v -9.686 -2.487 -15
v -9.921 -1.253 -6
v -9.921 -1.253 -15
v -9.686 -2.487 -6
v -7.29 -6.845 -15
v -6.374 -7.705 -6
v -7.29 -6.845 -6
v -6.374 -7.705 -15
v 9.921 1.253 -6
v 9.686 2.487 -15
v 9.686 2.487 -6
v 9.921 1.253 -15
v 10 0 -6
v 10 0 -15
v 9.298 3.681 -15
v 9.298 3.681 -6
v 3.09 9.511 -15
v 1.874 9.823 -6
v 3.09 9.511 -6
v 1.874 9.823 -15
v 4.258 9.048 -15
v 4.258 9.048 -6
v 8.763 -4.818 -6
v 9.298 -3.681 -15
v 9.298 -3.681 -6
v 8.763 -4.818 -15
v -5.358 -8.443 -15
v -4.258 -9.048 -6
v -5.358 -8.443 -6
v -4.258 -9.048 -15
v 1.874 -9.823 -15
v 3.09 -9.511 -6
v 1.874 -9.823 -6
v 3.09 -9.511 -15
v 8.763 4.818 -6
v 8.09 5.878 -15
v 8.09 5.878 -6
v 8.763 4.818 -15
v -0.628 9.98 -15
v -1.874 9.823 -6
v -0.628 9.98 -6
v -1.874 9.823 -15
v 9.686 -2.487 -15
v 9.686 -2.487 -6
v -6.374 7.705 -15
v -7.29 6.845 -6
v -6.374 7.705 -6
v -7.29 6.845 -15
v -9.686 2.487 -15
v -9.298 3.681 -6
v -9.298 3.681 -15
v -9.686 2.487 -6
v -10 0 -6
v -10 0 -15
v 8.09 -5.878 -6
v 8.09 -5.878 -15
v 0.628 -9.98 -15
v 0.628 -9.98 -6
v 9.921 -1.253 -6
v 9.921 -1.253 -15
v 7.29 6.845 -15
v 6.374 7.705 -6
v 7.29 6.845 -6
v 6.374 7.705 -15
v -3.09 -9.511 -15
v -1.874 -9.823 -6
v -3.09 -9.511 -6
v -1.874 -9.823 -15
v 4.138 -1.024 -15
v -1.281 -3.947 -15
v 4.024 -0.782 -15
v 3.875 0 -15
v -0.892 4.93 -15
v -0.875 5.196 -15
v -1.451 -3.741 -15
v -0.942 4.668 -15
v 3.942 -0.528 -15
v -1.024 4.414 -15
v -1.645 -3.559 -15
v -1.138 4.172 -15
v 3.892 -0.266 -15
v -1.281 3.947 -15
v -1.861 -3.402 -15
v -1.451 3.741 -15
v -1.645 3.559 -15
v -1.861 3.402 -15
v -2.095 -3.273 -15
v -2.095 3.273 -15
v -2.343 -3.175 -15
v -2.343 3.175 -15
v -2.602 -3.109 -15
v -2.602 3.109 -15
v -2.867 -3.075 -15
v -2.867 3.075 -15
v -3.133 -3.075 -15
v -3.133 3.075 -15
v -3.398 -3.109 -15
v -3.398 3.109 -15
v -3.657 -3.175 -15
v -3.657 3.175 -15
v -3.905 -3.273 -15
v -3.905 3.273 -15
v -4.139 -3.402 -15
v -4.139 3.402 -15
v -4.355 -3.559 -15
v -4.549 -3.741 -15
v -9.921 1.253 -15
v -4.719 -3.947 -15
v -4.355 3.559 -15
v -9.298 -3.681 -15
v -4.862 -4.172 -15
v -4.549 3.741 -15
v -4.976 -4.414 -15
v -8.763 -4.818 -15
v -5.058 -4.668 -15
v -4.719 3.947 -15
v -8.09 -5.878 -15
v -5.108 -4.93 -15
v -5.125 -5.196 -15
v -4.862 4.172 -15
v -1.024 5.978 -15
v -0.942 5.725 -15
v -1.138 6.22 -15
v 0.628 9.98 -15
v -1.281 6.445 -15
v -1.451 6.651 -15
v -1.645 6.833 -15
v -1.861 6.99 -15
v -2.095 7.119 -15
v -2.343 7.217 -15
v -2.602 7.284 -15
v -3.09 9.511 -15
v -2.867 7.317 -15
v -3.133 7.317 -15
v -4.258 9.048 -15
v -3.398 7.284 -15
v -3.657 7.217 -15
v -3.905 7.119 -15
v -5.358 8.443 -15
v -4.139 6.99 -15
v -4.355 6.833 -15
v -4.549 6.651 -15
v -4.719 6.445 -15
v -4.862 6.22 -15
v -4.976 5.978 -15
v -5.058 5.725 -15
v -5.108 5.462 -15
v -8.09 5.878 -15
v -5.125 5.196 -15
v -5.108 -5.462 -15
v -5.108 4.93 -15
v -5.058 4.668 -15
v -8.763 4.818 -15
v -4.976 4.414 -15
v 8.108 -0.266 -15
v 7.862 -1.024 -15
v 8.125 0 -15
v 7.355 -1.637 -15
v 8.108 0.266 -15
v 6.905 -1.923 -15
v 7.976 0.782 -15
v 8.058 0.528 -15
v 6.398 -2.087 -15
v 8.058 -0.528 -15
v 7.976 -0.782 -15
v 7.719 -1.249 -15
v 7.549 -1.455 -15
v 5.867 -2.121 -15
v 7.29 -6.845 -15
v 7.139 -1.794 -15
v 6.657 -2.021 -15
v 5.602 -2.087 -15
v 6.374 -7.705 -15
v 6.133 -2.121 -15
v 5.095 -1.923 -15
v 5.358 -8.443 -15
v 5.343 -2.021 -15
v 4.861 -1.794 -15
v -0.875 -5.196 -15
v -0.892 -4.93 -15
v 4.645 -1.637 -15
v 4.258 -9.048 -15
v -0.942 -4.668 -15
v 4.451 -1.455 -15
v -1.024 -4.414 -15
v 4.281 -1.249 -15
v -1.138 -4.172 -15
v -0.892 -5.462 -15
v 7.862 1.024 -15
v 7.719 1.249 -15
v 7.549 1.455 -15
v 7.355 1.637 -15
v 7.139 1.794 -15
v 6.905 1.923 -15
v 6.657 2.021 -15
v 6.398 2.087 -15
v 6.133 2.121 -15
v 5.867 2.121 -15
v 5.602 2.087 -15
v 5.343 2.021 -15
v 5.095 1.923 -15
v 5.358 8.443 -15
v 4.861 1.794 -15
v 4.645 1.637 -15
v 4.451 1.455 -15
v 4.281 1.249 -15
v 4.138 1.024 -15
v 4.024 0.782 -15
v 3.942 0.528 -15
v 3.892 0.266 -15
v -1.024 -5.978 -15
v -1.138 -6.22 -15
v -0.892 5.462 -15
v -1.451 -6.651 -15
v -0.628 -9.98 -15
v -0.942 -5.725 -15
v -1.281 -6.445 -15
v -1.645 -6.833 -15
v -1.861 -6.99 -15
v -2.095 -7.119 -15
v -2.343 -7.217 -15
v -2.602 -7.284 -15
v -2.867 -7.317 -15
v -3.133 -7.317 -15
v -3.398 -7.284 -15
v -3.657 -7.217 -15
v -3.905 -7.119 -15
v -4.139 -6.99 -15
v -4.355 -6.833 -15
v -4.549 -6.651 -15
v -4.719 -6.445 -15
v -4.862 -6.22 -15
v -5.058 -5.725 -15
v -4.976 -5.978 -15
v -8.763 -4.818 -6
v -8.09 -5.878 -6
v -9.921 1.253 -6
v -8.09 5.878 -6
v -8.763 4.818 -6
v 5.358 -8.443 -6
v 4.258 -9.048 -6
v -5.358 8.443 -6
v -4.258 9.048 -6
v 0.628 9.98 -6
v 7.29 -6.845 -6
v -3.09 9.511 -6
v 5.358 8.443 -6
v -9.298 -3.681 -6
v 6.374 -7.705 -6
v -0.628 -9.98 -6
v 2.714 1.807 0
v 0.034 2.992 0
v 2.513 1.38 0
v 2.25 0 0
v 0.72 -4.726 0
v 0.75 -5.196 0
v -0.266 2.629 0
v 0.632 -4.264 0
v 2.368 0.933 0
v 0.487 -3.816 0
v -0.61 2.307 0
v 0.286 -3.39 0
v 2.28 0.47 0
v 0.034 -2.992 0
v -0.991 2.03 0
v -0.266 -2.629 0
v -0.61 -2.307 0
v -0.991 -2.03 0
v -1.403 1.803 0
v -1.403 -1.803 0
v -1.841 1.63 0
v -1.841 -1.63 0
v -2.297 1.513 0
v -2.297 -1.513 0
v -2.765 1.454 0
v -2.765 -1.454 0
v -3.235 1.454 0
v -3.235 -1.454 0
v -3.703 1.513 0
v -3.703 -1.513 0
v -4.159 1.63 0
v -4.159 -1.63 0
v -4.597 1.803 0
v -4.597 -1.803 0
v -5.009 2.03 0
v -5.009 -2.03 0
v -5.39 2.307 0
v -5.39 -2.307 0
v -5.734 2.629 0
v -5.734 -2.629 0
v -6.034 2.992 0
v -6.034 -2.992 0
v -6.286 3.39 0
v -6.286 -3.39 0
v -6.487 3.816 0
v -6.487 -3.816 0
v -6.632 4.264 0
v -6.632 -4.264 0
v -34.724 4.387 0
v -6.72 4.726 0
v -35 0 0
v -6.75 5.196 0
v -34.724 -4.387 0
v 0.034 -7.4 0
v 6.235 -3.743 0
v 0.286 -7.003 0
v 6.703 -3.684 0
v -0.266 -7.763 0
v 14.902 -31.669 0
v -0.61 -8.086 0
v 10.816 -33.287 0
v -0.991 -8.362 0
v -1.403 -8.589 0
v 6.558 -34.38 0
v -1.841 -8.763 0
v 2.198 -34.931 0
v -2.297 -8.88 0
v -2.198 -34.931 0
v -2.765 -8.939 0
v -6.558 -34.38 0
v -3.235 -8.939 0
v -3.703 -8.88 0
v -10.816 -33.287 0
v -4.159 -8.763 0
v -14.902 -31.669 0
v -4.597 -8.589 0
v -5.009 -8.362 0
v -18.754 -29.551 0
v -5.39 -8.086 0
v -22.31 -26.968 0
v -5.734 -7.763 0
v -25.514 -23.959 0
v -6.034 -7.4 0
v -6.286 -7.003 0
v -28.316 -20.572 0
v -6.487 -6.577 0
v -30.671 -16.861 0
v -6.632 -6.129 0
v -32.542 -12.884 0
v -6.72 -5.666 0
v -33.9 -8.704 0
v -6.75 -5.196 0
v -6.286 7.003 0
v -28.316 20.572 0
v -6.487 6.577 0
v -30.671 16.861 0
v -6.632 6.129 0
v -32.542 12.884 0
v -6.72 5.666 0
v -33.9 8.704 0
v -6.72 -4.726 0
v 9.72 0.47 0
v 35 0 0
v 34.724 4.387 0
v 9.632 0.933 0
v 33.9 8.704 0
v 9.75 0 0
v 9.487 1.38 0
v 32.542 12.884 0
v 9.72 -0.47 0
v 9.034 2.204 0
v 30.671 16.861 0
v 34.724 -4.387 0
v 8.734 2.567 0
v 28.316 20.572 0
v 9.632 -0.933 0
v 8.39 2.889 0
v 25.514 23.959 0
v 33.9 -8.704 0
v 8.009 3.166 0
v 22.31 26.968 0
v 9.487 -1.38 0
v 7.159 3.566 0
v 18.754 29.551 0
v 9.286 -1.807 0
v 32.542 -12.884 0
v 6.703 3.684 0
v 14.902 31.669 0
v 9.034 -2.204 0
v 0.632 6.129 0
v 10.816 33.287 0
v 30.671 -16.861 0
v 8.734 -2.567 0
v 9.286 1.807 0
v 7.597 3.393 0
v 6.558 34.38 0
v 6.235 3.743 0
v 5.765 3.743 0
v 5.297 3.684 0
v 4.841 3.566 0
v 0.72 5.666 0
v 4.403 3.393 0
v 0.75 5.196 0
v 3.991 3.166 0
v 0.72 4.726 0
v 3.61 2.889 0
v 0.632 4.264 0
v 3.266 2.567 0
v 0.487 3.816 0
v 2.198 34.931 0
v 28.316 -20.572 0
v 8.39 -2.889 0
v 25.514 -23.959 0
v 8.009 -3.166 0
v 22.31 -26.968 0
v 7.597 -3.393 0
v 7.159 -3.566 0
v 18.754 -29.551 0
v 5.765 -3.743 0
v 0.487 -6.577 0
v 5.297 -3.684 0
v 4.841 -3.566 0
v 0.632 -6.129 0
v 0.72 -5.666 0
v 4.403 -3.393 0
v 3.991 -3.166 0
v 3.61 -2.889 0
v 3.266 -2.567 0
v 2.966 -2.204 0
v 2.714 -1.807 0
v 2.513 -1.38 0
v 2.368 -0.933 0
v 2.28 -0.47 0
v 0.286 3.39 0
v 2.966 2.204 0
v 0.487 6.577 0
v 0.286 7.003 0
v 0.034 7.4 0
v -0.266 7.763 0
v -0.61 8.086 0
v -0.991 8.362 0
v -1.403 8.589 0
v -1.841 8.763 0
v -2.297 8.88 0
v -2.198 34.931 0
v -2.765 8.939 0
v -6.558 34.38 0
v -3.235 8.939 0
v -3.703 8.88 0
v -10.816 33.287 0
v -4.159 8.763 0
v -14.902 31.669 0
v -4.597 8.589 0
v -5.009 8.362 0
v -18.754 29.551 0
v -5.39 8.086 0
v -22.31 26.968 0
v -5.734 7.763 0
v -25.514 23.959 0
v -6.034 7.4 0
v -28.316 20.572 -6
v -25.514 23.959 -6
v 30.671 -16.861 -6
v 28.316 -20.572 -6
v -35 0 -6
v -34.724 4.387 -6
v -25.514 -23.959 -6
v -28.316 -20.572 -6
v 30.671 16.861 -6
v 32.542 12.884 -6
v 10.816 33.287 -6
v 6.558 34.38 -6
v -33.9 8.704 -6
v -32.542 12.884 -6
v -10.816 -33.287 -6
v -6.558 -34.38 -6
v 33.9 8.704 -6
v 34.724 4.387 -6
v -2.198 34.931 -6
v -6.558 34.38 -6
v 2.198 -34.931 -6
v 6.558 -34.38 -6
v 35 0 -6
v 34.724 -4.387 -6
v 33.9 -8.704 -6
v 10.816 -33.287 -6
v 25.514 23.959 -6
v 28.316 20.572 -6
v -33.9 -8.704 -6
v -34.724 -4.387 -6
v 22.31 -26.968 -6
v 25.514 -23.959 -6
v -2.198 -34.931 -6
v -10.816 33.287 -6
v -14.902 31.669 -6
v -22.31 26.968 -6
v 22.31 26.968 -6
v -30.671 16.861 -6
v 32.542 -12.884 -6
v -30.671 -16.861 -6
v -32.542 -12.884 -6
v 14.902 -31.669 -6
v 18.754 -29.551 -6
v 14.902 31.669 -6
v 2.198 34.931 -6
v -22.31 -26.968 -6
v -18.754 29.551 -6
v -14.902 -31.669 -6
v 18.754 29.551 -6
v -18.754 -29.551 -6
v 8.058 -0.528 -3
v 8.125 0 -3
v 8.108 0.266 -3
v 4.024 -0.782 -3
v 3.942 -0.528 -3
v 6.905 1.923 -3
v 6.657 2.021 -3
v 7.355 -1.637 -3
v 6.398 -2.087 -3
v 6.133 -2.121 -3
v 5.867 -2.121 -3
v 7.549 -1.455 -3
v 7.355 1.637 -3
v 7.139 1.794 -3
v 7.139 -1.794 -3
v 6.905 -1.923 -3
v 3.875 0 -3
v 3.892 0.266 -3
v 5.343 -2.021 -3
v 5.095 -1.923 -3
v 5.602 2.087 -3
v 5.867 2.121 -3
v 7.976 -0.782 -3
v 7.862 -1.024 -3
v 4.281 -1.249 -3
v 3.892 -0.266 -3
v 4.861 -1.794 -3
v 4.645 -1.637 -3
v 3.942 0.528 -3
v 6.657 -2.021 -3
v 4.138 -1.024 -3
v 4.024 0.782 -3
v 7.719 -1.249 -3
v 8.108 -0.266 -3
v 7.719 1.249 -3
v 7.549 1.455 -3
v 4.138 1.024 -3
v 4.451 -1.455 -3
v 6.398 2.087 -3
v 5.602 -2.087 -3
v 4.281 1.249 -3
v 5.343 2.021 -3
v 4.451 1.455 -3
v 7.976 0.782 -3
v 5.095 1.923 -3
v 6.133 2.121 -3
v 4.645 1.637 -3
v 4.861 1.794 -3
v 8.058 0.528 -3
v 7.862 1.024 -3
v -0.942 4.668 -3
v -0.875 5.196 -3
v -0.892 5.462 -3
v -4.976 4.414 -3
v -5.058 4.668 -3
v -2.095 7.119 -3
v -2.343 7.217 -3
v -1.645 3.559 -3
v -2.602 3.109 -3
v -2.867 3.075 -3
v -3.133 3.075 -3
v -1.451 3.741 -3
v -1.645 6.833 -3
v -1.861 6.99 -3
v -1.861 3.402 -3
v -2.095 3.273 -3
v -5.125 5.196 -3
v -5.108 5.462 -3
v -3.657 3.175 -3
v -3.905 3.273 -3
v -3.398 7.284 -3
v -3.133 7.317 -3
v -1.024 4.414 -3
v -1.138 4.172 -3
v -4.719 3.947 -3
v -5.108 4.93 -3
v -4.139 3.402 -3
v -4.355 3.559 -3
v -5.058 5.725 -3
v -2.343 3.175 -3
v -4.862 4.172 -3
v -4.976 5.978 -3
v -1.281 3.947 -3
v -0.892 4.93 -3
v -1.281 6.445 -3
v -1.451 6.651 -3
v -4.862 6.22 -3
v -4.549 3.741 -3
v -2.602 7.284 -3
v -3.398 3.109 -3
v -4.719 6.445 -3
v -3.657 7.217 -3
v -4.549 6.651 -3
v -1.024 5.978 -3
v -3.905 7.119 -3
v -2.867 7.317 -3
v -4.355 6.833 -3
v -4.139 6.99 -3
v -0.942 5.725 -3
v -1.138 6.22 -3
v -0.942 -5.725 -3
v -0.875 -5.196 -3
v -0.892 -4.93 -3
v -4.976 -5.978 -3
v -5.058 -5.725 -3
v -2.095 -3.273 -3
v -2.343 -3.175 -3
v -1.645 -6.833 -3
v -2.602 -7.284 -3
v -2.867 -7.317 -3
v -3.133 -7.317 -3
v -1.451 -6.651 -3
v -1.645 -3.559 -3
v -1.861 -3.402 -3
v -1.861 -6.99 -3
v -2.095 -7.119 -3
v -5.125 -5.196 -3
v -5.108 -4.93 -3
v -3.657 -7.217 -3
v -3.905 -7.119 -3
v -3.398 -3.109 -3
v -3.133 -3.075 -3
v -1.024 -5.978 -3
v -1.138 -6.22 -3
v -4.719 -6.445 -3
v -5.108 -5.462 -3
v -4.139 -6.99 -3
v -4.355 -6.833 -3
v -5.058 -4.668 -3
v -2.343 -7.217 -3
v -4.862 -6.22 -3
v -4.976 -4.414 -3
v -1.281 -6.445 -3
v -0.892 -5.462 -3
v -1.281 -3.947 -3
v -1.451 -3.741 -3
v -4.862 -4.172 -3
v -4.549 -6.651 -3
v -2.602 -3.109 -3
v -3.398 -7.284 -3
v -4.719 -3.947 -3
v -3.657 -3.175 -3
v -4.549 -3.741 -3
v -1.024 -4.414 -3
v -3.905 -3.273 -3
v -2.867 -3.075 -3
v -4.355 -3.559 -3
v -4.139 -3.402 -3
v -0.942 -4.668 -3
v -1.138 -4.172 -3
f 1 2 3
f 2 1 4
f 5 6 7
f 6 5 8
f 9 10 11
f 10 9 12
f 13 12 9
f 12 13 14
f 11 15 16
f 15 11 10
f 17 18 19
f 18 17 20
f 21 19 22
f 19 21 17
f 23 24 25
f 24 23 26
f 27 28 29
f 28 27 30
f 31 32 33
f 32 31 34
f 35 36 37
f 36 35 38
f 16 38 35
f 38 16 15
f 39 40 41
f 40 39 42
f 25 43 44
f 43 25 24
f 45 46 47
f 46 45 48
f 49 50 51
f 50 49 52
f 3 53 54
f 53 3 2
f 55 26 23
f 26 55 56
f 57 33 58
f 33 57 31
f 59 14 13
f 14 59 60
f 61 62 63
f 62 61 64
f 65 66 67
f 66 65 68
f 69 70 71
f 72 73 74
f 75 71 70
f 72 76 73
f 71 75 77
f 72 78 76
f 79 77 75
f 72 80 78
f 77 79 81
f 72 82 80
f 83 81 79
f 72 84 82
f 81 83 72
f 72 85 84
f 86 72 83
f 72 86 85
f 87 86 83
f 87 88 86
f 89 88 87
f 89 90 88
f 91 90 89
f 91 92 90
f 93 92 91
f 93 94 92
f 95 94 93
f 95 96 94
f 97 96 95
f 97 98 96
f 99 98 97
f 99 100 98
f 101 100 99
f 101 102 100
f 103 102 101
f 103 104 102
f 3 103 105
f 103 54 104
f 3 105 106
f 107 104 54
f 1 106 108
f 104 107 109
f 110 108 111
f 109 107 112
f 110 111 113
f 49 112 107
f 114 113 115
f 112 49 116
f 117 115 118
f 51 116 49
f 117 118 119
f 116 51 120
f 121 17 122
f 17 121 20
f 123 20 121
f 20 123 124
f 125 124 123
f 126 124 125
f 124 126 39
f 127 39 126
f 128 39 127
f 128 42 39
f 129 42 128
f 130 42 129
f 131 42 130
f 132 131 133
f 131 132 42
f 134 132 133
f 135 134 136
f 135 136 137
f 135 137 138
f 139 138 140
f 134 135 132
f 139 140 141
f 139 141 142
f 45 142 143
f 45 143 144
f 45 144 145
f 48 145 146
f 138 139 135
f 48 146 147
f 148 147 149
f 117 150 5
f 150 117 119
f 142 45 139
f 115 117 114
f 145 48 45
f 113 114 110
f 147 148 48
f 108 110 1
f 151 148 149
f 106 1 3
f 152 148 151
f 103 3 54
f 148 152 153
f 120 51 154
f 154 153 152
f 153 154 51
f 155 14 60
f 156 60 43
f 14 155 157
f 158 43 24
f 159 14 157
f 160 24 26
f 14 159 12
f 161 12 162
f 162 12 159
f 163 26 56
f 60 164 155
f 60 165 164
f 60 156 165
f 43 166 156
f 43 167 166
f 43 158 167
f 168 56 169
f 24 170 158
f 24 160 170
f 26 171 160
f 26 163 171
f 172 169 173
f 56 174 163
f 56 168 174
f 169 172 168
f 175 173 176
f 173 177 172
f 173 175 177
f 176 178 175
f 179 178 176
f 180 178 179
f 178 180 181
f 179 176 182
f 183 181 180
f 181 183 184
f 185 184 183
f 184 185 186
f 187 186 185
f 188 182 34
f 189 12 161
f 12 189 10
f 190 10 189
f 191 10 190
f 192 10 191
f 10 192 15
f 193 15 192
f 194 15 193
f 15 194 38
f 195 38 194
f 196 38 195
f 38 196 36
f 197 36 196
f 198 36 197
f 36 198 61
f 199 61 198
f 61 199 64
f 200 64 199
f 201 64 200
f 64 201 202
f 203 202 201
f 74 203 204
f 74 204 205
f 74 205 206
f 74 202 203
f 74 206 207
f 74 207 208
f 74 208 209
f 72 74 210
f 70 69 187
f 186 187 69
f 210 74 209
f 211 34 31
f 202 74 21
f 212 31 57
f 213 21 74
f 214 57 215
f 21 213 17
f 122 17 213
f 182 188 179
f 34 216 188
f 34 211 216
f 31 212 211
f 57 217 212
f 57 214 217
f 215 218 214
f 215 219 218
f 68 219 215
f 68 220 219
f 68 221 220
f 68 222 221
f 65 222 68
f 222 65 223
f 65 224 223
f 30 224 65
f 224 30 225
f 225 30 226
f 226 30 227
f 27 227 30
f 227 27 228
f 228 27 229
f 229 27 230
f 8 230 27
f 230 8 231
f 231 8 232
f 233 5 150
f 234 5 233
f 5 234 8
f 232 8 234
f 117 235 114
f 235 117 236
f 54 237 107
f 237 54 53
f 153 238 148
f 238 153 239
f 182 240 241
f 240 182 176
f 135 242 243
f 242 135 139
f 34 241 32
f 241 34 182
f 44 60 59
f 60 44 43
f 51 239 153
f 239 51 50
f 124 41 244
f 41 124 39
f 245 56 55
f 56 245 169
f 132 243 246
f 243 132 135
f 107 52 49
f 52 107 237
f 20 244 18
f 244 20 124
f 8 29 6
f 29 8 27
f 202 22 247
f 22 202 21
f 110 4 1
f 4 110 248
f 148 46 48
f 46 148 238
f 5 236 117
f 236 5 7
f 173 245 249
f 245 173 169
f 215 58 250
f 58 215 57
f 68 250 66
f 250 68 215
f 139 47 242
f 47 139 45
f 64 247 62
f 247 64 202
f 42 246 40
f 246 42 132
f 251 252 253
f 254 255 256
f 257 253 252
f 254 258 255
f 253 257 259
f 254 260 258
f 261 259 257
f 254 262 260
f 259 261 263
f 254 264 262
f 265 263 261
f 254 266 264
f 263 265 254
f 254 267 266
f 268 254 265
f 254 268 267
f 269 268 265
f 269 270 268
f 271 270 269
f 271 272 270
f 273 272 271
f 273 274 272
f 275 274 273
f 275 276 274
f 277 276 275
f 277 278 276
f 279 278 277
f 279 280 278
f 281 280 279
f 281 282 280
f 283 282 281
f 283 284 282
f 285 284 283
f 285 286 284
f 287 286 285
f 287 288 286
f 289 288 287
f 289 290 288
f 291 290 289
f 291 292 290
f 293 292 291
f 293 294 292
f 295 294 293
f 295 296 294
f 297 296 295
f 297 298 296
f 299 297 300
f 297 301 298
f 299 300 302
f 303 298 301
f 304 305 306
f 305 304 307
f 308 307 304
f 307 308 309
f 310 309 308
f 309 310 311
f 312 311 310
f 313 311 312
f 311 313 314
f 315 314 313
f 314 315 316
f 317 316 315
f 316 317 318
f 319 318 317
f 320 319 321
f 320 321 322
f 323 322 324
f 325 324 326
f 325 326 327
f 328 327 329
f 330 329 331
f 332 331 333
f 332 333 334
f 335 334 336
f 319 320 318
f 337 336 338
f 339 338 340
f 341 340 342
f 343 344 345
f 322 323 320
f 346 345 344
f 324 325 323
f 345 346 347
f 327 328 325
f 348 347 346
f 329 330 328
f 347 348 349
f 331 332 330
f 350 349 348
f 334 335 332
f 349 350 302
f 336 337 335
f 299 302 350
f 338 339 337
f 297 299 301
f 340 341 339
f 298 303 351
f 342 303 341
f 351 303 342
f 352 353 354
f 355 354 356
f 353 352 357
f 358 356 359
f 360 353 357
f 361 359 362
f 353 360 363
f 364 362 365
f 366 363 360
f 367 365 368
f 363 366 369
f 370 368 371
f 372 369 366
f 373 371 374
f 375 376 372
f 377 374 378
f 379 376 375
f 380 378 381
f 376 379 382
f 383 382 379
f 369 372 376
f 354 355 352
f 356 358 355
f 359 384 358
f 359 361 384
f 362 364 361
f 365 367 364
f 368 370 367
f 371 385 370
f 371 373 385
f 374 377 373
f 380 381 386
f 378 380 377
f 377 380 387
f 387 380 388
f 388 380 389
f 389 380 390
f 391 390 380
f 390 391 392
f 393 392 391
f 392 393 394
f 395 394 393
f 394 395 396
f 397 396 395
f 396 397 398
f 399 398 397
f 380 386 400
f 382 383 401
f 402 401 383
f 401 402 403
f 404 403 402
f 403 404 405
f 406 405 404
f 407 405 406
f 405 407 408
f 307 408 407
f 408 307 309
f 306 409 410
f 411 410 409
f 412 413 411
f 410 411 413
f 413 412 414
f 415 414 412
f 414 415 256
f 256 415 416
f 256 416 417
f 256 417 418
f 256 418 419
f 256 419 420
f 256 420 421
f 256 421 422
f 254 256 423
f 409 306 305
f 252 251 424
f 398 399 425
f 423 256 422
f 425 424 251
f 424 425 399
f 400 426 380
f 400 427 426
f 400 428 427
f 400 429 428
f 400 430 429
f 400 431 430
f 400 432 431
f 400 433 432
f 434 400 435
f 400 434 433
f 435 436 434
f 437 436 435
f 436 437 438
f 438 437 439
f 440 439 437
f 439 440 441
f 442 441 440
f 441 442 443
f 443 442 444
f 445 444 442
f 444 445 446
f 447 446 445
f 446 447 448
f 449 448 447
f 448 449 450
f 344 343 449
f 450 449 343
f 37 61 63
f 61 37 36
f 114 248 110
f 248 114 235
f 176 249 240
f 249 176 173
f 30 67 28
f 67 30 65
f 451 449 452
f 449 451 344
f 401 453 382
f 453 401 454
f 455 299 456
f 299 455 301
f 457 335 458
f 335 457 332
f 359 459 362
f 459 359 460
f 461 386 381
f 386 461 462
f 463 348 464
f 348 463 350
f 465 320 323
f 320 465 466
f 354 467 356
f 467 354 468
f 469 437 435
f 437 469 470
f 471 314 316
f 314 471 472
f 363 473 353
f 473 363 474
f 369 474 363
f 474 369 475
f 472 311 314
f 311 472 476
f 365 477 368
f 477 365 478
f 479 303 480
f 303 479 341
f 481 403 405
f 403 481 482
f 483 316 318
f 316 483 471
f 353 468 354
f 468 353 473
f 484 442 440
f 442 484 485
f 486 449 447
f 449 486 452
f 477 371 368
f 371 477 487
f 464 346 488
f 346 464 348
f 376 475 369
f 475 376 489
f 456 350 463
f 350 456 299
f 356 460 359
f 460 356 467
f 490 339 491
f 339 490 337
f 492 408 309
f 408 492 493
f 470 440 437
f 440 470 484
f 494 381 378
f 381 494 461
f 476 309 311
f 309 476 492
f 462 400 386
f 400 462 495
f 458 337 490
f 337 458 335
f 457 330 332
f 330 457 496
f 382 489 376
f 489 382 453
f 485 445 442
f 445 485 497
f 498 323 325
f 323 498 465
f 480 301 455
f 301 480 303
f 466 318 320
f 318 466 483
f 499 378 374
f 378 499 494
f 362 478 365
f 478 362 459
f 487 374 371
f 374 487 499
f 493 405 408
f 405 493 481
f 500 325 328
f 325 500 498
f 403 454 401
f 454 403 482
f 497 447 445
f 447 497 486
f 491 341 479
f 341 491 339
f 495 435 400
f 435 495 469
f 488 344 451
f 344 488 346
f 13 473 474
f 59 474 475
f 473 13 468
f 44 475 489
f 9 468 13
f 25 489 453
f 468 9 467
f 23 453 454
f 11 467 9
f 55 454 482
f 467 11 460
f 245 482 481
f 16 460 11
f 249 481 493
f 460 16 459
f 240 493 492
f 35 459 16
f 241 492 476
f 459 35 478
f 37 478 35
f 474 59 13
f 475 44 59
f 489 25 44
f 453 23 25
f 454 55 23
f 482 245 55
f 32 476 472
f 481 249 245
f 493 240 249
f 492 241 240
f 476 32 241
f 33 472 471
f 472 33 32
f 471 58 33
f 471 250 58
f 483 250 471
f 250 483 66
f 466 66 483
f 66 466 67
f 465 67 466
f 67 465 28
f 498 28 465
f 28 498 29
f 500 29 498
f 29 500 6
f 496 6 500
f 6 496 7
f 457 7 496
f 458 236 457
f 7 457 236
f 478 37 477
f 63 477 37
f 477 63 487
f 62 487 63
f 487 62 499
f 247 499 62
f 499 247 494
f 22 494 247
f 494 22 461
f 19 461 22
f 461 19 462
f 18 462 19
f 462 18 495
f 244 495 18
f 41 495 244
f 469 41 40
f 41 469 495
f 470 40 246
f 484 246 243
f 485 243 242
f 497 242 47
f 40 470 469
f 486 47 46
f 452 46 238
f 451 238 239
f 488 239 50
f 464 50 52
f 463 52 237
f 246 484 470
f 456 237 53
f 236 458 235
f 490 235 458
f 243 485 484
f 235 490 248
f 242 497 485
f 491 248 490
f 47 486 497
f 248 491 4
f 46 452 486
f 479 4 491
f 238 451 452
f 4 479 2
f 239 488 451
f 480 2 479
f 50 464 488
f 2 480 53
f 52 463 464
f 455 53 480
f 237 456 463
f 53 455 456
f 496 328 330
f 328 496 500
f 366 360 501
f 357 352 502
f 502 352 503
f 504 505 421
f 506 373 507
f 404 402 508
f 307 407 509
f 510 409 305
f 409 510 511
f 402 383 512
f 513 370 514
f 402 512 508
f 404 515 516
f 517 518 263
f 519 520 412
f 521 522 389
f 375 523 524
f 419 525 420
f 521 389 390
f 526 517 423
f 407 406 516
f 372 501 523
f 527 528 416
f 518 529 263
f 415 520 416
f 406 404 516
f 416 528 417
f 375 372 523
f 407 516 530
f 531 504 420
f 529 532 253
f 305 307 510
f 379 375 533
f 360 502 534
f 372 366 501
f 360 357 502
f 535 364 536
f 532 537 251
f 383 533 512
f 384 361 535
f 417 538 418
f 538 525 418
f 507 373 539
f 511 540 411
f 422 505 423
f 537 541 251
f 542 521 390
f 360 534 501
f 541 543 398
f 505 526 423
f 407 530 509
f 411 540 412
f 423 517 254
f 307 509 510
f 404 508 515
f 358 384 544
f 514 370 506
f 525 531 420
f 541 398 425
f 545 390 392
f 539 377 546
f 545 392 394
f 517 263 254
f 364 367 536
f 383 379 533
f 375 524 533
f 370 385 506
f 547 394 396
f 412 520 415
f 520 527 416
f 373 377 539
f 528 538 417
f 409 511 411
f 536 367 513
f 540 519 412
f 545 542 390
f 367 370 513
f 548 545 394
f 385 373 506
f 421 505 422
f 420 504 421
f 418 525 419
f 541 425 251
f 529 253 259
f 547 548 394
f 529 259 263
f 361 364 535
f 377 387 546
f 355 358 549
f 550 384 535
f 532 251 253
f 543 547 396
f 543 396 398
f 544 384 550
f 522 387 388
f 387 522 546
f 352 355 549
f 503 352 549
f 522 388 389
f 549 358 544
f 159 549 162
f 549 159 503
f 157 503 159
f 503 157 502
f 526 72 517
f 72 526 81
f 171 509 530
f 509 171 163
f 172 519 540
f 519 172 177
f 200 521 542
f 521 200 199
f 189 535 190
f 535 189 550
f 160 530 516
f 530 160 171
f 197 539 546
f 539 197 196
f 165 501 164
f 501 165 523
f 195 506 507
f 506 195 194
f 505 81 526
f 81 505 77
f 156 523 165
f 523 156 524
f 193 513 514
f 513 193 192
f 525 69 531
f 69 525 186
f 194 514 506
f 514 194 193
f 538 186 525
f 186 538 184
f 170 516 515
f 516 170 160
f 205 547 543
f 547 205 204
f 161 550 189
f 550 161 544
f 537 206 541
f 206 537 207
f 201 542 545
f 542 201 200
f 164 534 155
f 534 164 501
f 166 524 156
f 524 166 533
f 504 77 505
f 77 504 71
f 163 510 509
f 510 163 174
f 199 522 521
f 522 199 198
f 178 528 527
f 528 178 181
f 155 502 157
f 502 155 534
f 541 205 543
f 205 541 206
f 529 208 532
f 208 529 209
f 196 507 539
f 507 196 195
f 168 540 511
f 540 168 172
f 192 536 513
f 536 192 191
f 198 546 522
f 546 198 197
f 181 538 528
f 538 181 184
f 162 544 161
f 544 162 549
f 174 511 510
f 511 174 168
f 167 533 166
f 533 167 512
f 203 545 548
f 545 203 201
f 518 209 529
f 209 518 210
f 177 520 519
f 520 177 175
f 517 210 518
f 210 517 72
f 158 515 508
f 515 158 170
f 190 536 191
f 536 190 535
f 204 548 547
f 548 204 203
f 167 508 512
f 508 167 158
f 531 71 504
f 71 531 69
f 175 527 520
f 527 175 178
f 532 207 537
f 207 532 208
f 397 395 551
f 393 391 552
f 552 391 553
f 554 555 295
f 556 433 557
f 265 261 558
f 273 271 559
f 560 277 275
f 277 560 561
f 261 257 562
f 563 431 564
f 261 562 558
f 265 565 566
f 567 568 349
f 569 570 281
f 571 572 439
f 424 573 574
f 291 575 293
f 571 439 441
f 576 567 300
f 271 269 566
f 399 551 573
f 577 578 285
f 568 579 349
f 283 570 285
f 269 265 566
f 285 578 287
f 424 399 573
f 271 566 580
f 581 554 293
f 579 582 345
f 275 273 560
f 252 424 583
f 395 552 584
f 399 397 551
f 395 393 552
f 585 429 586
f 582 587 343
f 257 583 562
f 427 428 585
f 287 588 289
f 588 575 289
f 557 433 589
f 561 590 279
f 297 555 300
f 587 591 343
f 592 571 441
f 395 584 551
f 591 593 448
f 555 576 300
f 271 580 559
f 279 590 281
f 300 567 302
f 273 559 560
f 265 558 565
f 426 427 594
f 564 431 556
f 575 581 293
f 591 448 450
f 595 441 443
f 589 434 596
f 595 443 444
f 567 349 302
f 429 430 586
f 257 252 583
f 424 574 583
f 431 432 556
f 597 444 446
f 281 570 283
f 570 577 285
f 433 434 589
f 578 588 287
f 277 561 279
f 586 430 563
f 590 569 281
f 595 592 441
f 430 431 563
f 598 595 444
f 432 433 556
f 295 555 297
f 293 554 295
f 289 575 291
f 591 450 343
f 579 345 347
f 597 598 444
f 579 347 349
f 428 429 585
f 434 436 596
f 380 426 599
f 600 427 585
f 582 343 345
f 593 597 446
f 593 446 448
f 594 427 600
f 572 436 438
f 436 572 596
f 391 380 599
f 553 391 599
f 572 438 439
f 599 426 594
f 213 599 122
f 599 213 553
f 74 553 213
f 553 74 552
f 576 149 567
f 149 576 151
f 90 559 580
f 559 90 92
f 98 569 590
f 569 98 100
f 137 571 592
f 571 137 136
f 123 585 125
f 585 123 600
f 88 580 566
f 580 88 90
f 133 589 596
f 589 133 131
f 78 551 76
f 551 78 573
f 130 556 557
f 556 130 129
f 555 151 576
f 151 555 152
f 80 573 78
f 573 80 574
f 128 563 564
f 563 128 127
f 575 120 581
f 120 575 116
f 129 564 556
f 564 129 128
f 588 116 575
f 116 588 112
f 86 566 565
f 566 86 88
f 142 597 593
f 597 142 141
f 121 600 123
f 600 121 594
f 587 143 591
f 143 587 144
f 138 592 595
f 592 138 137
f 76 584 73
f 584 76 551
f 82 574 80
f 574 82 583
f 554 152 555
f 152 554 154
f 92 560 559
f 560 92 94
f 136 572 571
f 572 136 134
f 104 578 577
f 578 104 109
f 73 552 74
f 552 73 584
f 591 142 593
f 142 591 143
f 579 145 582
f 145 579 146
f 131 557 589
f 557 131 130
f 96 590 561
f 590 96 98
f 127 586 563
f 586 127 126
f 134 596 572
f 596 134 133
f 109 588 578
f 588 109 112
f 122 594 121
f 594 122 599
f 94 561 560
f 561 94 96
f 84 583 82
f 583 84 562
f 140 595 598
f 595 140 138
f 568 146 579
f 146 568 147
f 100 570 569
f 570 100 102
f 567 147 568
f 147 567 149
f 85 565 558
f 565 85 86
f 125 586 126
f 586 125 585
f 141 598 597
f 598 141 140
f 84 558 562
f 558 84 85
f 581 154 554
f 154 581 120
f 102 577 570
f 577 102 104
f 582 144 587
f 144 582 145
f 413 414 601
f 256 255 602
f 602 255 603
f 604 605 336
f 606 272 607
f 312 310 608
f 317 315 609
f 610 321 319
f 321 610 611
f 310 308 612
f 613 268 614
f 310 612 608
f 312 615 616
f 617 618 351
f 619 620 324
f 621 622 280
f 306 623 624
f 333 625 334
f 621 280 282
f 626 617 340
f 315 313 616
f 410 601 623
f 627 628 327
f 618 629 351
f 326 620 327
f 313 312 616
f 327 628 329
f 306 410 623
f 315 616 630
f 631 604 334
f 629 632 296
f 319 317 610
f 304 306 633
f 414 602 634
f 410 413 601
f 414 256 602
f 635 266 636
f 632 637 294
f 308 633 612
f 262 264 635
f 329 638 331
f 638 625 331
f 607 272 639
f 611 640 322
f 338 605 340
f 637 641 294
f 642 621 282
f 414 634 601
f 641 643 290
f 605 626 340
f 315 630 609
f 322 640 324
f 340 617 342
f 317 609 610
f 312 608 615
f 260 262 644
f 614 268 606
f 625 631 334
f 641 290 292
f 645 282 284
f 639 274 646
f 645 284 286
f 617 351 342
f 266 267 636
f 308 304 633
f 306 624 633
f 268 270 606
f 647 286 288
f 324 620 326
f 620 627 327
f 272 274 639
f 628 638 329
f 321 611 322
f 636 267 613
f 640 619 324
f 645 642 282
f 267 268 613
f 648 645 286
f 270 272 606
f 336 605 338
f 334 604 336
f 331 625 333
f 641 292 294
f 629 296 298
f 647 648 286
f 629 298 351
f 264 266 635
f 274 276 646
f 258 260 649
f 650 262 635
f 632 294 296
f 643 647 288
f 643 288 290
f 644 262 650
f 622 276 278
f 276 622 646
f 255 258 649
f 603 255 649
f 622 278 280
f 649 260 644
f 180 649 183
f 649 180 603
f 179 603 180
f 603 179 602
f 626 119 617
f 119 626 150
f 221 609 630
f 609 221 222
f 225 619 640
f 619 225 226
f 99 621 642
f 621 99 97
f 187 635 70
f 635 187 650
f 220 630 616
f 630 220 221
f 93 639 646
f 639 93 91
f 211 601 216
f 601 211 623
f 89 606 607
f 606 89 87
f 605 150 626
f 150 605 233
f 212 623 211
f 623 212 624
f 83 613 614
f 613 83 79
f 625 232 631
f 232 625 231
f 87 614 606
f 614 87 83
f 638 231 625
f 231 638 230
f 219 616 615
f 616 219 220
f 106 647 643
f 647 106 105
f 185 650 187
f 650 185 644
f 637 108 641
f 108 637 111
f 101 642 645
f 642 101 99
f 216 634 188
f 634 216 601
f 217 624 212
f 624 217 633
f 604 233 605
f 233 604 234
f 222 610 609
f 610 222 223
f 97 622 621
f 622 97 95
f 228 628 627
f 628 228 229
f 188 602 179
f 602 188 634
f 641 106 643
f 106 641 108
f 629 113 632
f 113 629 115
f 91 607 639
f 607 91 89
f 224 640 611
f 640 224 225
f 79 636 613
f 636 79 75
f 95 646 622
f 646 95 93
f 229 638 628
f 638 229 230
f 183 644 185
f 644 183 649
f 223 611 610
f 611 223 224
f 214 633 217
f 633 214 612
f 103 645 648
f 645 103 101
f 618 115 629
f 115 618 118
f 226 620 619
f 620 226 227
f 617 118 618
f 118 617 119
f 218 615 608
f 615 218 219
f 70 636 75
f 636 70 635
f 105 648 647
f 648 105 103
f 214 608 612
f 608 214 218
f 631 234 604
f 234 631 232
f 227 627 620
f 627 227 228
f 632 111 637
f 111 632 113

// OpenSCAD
$fn = 50;


difference() {
	union() {
		translate(v = [0, 0, -15.0000000000]) {
			cylinder(h = 15, r = 10.0000000000);
		}
		translate(v = [0, 0, -6.0000000000]) {
			cylinder(h = 6, r = 35.0000000000);
		}
	}
	union() {
		translate(v = [6.0000000000, 0.0000000000, 0]) {
			rotate(a = [0, 0, 0]) {
				difference() {
					union() {
						#translate(v = [0, 0, -15.0000000000]) {
							cylinder(h = 15, r = 2.0000000000);
						}
						#translate(v = [0, 0, -3]) {
							cylinder(h = 3, r = 10.0000000000, r1 = 2.1250000000, r2 = 3.7500000000);
						}
						#translate(v = [0, 0, -15.0000000000]) {
							cylinder(h = 15, r = 2.1250000000);
						}
						#translate(v = [0, 0, -15.0000000000]) {
							cylinder(h = 15, r = 2.0000000000);
						}
					}
					union();
				}
			}
		}
		translate(v = [-3.0000000000, 5.1961524227, 0]) {
			rotate(a = [0, 0, 0]) {
				difference() {
					union() {
						#translate(v = [0, 0, -15.0000000000]) {
							cylinder(h = 15, r = 2.0000000000);
						}
						#translate(v = [0, 0, -3]) {
							cylinder(h = 3, r = 10.0000000000, r1 = 2.1250000000, r2 = 3.7500000000);
						}
						#translate(v = [0, 0, -15.0000000000]) {
							cylinder(h = 15, r = 2.1250000000);
						}
						#translate(v = [0, 0, -15.0000000000]) {
							cylinder(h = 15, r = 2.0000000000);
						}
					}
					union();
				}
			}
		}
		translate(v = [-3.0000000000, -5.1961524227, 0]) {
			rotate(a = [0, 0, 0]) {
				difference() {
					union() {
						#translate(v = [0, 0, -15.0000000000]) {
							cylinder(h = 15, r = 2.0000000000);
						}
						#translate(v = [0, 0, -3]) {
							cylinder(h = 3, r = 10.0000000000, r1 = 2.1250000000, r2 = 3.7500000000);
						}
						#translate(v = [0, 0, -15.0000000000]) {
							cylinder(h = 15, r = 2.1250000000);
						}
						#translate(v = [0, 0, -15.0000000000]) {
							cylinder(h = 15, r = 2.0000000000);
						}
					}
					union();
				}
			}
		}
	}
}
